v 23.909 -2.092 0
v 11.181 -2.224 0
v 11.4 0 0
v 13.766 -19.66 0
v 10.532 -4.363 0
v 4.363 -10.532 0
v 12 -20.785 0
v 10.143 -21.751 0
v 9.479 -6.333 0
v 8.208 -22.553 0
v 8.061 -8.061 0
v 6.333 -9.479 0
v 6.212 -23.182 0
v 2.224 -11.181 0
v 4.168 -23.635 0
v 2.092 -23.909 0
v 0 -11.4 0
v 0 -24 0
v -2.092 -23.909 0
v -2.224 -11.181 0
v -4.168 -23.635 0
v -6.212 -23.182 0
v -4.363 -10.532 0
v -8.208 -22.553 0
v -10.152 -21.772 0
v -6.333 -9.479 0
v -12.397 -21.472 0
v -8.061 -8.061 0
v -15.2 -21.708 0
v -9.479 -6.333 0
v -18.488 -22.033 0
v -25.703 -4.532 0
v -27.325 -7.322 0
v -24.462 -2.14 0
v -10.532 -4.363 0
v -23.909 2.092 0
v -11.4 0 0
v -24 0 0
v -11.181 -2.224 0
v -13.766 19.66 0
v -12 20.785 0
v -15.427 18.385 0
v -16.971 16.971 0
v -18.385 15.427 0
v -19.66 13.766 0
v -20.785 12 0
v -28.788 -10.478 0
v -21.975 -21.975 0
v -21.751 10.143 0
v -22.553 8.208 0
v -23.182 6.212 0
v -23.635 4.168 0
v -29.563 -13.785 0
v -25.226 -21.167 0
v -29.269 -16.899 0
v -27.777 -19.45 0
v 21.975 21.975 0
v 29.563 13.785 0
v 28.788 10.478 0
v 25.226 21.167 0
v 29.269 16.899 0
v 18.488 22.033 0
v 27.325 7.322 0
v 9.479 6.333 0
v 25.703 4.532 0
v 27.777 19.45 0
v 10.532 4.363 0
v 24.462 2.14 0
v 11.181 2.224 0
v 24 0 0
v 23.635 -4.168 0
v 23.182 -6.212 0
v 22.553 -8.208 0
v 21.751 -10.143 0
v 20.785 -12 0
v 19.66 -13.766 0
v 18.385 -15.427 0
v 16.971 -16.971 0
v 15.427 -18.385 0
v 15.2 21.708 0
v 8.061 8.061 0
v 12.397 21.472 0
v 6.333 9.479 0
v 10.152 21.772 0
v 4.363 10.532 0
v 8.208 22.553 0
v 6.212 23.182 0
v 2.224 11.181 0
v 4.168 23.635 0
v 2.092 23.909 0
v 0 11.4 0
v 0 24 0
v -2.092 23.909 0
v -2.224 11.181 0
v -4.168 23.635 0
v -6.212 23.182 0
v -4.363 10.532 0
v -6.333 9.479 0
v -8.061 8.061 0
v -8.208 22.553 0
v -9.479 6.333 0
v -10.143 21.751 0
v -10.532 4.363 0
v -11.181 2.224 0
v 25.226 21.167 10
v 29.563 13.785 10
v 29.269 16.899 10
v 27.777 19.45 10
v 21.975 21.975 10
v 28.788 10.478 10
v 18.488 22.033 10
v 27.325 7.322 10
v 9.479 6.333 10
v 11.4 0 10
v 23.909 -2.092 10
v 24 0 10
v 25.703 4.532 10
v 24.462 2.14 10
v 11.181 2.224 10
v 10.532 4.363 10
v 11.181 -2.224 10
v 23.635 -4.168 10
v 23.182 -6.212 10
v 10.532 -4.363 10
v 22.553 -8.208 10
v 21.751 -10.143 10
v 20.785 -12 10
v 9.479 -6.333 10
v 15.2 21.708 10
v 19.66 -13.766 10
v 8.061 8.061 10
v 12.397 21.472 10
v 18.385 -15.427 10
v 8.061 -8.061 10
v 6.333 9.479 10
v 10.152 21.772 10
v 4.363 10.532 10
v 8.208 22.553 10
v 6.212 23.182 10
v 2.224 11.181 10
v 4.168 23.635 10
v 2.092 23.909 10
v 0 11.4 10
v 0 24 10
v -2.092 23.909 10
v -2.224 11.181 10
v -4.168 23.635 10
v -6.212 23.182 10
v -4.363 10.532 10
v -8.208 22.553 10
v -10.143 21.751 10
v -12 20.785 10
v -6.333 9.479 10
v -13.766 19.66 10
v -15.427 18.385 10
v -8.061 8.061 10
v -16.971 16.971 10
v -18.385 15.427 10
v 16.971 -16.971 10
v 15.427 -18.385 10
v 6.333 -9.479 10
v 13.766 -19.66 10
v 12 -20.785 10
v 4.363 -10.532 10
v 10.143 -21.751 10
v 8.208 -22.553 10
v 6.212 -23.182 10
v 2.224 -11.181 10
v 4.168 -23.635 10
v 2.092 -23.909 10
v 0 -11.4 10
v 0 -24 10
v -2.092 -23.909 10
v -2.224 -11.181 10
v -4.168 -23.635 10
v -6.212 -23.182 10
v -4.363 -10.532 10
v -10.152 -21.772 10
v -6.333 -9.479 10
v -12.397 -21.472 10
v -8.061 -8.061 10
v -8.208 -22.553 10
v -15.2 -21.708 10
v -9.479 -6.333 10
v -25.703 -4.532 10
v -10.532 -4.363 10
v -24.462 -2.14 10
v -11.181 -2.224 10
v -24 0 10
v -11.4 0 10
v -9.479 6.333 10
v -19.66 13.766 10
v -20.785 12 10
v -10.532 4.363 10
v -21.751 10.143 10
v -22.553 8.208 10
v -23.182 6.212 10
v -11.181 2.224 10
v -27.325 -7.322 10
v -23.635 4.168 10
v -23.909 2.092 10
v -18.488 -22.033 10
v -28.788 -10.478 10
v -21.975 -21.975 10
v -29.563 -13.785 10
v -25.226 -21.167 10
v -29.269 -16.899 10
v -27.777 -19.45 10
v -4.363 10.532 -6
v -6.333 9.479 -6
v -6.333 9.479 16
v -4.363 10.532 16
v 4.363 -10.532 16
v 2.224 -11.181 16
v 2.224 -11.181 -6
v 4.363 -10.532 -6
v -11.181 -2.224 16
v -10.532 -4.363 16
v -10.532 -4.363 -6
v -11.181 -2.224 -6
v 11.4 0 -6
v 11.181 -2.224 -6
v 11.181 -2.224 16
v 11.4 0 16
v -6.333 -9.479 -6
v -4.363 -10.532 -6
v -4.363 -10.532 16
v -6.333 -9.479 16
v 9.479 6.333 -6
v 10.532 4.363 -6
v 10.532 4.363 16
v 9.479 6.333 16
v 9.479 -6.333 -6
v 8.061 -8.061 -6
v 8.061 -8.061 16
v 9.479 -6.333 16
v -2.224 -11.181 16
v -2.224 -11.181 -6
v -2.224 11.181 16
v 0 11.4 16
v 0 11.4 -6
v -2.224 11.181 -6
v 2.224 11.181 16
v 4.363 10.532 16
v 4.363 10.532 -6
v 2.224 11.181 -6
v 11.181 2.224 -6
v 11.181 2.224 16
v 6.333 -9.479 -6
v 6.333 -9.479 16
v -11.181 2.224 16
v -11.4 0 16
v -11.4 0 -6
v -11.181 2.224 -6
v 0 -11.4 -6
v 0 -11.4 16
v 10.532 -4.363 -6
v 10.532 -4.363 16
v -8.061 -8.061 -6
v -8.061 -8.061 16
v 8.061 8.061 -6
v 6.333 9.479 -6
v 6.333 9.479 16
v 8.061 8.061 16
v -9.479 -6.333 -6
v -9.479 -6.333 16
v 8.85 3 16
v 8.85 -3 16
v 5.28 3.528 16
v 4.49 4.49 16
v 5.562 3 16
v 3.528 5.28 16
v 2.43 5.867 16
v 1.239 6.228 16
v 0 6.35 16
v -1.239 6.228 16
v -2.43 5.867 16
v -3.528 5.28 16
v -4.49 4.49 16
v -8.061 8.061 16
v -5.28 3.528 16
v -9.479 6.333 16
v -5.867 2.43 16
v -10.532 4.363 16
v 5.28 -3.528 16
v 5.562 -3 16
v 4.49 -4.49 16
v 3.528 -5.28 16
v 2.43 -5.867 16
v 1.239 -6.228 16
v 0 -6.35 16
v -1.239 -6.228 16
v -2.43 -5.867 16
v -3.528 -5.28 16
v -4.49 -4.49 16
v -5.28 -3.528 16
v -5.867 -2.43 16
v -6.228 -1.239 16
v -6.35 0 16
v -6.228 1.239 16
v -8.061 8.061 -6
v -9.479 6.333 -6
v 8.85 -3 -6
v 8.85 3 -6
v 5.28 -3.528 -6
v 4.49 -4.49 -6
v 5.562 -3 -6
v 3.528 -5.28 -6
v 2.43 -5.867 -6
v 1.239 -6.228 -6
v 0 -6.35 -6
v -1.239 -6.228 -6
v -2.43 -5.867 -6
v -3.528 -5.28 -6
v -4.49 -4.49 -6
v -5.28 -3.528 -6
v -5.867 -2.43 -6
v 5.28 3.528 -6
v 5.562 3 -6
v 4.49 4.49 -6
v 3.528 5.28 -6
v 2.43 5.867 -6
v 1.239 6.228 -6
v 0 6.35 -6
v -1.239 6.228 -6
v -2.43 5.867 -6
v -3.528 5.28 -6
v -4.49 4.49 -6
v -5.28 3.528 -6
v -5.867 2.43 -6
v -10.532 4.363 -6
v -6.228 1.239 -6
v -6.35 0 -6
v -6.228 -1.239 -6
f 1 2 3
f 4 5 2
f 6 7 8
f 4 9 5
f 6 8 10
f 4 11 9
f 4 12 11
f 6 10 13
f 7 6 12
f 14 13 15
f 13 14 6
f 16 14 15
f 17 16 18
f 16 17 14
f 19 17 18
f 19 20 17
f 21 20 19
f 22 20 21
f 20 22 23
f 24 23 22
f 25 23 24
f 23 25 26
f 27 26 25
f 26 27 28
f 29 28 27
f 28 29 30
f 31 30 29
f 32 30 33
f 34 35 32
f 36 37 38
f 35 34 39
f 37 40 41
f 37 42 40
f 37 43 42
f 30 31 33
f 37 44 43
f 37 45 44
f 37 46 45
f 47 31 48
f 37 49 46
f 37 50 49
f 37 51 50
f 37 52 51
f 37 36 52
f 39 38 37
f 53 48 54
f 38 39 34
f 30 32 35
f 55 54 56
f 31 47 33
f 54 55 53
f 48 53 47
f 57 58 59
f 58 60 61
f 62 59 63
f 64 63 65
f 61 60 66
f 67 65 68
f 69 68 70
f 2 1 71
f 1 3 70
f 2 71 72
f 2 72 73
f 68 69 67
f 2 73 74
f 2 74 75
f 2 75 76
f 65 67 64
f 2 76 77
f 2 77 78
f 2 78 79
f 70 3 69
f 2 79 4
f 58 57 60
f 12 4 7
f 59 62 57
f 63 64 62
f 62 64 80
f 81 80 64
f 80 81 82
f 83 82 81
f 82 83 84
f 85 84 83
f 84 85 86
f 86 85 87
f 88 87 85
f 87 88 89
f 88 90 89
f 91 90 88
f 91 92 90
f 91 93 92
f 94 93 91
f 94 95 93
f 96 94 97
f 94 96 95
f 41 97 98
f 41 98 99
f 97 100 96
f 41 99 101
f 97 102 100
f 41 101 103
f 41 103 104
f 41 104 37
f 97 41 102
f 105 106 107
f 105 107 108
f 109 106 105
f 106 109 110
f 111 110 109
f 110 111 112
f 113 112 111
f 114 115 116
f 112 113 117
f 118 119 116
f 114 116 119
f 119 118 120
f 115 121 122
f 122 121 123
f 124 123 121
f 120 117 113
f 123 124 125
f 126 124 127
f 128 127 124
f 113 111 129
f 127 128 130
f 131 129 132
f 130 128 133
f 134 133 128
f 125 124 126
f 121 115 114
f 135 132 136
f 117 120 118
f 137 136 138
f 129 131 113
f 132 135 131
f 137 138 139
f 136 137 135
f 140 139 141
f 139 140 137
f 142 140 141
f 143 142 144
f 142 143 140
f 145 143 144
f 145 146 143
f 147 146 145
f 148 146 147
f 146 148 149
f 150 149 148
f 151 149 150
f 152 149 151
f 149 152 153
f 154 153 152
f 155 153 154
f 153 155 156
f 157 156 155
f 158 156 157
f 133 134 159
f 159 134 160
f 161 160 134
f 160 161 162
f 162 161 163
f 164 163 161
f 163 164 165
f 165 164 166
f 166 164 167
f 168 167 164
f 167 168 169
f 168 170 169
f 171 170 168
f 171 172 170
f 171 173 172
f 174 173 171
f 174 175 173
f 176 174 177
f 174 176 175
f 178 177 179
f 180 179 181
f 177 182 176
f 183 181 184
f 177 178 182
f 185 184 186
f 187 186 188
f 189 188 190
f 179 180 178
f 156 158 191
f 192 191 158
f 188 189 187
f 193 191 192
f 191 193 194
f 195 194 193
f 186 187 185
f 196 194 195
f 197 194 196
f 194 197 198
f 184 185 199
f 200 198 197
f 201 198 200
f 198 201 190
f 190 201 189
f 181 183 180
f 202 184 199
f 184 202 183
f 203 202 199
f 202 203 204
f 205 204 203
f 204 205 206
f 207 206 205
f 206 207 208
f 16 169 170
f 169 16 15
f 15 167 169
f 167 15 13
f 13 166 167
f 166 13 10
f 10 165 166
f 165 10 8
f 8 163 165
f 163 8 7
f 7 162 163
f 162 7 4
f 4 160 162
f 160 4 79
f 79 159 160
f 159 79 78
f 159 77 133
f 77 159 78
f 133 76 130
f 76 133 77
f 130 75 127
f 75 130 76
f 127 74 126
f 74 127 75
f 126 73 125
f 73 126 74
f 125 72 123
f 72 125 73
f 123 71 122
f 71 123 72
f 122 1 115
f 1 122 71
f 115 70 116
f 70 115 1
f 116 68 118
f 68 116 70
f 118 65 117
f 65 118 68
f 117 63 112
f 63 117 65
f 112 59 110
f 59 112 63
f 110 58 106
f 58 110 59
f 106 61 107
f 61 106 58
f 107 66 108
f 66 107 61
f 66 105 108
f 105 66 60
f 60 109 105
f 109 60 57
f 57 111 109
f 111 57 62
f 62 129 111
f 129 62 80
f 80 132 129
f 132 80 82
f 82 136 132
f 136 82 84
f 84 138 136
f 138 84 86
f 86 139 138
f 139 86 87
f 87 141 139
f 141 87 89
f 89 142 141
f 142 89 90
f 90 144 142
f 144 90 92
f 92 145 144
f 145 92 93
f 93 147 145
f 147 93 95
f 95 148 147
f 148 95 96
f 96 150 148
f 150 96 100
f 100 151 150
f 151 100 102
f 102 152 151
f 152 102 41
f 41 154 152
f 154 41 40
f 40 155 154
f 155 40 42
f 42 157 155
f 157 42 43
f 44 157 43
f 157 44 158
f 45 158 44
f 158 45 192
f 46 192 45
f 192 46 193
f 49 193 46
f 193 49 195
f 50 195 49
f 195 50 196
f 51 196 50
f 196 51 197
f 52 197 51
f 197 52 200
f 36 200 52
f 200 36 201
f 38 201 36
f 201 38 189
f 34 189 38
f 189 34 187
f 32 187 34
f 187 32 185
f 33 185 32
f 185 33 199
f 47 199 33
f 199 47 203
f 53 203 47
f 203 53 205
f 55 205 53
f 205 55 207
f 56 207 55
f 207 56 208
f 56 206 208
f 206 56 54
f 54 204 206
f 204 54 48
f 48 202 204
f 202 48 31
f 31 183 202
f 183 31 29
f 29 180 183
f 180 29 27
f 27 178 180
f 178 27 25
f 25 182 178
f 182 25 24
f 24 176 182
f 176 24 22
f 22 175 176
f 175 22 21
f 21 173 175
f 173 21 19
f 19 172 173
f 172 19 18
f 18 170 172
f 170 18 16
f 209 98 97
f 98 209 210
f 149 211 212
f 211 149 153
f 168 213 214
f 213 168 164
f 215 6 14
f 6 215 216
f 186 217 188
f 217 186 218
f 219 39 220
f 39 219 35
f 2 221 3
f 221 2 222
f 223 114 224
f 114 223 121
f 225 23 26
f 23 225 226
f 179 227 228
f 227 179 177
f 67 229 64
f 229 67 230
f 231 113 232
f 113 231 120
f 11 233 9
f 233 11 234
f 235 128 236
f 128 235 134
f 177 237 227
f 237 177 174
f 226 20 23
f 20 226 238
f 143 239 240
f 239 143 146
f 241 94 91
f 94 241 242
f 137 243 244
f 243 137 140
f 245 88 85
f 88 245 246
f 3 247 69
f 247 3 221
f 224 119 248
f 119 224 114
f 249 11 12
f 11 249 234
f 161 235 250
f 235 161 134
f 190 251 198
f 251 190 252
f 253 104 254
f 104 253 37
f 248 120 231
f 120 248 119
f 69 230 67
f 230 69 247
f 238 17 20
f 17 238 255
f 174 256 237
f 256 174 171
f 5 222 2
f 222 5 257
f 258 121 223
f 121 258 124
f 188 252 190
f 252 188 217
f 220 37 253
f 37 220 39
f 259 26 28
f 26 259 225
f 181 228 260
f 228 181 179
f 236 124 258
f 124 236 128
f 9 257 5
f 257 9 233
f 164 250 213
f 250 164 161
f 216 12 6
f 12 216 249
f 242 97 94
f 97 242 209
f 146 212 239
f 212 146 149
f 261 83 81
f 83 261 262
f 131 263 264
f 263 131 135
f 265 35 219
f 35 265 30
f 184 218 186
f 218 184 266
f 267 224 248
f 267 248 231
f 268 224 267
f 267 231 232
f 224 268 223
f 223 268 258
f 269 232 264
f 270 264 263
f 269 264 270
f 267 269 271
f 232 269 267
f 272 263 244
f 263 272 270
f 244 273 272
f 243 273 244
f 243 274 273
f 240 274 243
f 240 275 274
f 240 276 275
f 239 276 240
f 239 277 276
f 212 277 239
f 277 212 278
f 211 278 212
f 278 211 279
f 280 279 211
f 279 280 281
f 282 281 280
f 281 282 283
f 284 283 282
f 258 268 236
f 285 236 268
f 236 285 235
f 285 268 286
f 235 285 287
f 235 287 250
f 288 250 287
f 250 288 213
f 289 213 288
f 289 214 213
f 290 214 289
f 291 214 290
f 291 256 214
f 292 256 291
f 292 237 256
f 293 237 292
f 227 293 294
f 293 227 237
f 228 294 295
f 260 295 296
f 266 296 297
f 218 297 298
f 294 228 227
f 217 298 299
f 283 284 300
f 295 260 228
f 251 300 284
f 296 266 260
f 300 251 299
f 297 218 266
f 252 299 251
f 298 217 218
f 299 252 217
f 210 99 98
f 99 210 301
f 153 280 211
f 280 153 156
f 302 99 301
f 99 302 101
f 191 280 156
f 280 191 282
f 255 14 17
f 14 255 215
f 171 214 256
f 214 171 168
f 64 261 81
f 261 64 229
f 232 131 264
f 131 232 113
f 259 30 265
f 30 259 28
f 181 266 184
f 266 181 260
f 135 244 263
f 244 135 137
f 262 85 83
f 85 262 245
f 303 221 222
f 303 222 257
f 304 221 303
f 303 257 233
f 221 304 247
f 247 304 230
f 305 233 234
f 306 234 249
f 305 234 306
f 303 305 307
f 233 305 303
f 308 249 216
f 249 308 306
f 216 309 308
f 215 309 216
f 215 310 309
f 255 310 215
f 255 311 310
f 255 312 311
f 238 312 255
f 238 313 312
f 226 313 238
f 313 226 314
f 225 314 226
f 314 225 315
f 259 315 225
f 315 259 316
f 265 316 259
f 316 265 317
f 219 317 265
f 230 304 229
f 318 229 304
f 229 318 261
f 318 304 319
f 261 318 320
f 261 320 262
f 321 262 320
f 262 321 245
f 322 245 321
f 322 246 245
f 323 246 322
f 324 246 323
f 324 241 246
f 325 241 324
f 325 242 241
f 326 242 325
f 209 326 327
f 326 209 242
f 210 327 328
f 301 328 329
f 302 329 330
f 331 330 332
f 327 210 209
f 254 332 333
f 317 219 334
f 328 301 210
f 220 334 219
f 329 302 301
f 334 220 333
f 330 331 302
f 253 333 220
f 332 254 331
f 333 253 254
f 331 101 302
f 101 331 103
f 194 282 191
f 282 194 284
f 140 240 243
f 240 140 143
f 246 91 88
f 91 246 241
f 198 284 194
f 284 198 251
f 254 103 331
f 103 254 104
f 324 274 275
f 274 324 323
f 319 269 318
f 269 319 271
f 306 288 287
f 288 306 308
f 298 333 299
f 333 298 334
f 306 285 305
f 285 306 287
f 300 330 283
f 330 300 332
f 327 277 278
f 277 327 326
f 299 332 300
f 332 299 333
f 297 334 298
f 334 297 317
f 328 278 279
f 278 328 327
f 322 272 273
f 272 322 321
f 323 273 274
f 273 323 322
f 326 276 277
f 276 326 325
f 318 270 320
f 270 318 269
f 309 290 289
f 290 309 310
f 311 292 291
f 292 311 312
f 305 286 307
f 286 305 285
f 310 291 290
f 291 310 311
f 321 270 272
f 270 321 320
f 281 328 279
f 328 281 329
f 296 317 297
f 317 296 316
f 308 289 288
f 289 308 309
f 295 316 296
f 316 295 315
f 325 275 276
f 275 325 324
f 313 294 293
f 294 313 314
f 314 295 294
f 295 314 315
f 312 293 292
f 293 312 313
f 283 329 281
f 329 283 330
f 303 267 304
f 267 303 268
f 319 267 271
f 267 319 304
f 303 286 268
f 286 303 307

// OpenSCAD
$fn = 32;

// ----------------------------------------------------------------------
// Cam: base radius 24 mm with a 10 mm lift over 120 degrees
// ----------------------------------------------------------------------

// --- parameters (mm) ---
base_r = 24;              // base radius
lift = 10;                // lift height above the base radius
lift_span = 120;          // angular width of the lift
lift_start = 0;           // angle where the lift starts
cam_t = 10;               // cam plate thickness
hub_d = 22.8;             // hub diameter
hub_h = 22;               // hub height
bore_d = 12.7;            // bore
key_w = 6;                // keyway width
key_depth = 3;            // keyway depth

cam_profile = [[24, 0], [24.462, 2.14], [25.703, 4.532], [27.325, 7.322], [28.788, 10.478], [29.563, 13.785], [29.269, 16.899], [27.777, 19.45], [25.226, 21.167], [21.975, 21.975], [18.488, 22.033], [15.2, 21.708], [12.397, 21.472], [10.152, 21.772], [8.208, 22.553], [6.212, 23.182], [4.168, 23.635], [2.092, 23.909], [0, 24], [-2.092, 23.909], [-4.168, 23.635], [-6.212, 23.182], [-8.208, 22.553], [-10.143, 21.751], [-12, 20.785], [-13.766, 19.66], [-15.427, 18.385], [-16.971, 16.971], [-18.385, 15.427], [-19.66, 13.766], [-20.785, 12], [-21.751, 10.143], [-22.553, 8.208], [-23.182, 6.212], [-23.635, 4.168], [-23.909, 2.092], [-24, 0], [-24.462, -2.14], [-25.703, -4.532], [-27.325, -7.322], [-28.788, -10.478], [-29.563, -13.785], [-29.269, -16.899], [-27.777, -19.45], [-25.226, -21.167], [-21.975, -21.975], [-18.488, -22.033], [-15.2, -21.708], [-12.397, -21.472], [-10.152, -21.772], [-8.208, -22.553], [-6.212, -23.182], [-4.168, -23.635], [-2.092, -23.909], [0, -24], [2.092, -23.909], [4.168, -23.635], [6.212, -23.182], [8.208, -22.553], [10.143, -21.751], [12, -20.785], [13.766, -19.66], [15.427, -18.385], [16.971, -16.971], [18.385, -15.427], [19.66, -13.766], [20.785, -12], [21.751, -10.143], [22.553, -8.208], [23.182, -6.212], [23.635, -4.168], [23.909, -2.092]];

difference() {
  union() {
    linear_extrude(height = cam_t) polygon(cam_profile);
    /* hub, proud of the cam plate on both sides */
    translate([0, 0, -6]) cylinder(h = hub_h, d = hub_d);
  }
  /* bore through the hub, 2.5 mm clear on both faces */
  translate([0, 0, -8.5]) cylinder(h = hub_h + 5, d = bore_d);
  /* keyway, milled through the whole hub */
  translate([3.35, -3, -8.5]) cube([5.5, 6, 27]);
}
